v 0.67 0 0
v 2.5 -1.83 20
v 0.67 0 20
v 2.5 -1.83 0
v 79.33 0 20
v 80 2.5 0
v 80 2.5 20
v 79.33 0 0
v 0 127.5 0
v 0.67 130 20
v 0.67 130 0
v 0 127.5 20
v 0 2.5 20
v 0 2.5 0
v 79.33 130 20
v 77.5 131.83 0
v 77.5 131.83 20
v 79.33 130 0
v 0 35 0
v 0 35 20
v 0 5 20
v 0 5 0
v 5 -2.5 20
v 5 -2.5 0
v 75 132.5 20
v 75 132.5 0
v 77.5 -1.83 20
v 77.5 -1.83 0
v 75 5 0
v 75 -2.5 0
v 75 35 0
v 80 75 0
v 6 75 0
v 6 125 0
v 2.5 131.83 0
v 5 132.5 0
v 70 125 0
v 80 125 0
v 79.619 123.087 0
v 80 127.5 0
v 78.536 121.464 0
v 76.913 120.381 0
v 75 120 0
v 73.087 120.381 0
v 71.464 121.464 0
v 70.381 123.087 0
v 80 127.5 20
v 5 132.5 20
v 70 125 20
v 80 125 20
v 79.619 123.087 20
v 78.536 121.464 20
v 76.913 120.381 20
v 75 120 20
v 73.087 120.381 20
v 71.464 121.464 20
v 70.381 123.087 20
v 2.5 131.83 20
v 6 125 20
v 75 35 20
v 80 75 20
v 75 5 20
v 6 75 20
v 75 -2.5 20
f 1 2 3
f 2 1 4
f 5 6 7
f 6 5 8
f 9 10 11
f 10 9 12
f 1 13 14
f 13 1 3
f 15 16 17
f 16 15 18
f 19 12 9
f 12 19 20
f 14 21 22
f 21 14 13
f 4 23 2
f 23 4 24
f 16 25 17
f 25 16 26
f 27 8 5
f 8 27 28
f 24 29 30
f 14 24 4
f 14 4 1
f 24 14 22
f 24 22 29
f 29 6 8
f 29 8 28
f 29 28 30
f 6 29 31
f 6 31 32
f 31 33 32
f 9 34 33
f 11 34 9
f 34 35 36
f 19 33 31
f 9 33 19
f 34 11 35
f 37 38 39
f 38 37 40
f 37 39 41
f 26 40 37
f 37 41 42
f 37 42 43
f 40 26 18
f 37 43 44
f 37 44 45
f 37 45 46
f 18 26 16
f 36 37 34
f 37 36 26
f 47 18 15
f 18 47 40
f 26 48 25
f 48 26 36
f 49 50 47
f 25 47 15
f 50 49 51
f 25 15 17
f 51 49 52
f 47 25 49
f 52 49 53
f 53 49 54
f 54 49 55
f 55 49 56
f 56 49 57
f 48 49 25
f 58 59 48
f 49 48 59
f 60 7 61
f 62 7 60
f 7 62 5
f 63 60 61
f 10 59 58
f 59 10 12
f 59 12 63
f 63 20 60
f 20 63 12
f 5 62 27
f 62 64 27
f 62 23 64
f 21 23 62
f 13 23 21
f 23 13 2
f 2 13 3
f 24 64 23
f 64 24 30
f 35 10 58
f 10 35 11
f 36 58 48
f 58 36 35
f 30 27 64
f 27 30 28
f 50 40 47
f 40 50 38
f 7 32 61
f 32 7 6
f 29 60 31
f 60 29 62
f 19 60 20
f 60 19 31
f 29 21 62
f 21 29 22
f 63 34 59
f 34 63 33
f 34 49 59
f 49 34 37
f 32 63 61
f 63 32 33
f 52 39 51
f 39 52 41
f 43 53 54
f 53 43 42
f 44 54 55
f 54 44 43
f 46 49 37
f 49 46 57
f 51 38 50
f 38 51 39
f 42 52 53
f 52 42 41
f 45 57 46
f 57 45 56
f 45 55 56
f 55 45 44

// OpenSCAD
// Customizable Desk Hook
// by knarfishness
// Diesel Powered Robotics, 2013

// variables

//Total width
width = 80;

//Total length
length = 130;

// The width of the surface to clamp to
clamp_width = 30;

// The width of the hook
hook_width = 50;

// The thickness of the hook
thickness = 5;

// Hook height
height = 20;

// Catch Diameter 
catch = 5;

// Rounding Radius (1 to 40)
rounding_radius = 5;

// Clamp Depth Offset
clamp_offset = 0;

// Hook Depth Offset
hook_offset = 0;

add_catch = "true"; // [true,false]


// size - [x,y,z]
// radius - radius of corners
module roundedRect(size, radius)
{
	x = size[0];
	y = size[1];
	z = size[2];

	linear_extrude(height=z)
	hull()
	{
		// place 4 circles in the corners, with the given radius
		translate([(-x/2)+(radius/2), (-y/2)+(radius/2), 0])
		circle(r=radius);
	
		translate([(x/2)-(radius/2), (-y/2)+(radius/2), 0])
		circle(r=radius);
	
		translate([(-x/2)+(radius/2), (y/2)-(radius/2), 0])
		circle(r=radius);
	
		translate([(x/2)-(radius/2), (y/2)-(radius/2), 0])
		circle(r=radius);
	}
}


module base()
{
	//cube([width, length, height]);
	translate([width/2,length/2,0])
	roundedRect([width-rounding_radius, length, height], rounding_radius, $fn=12);
}

module clamp()
{
	translate([-1,thickness,-2])
	cube([width-thickness-clamp_offset+1, clamp_width, height+4]);
}

module hook()
{
	translate([thickness + hook_offset +1, length - hook_width - thickness,-2])
	cube([width-thickness+1, hook_width, height+4]);
}

module top()
{
	difference()
	{
		base();
		clamp();
	}
}

module loop()
{
	translate([width - catch,length-thickness,0])
	cylinder(h = height, r1 = catch, r2 = catch, center = false);
}

module final()
{
	difference()
	{
		top();
		hook();
	}
}

if(add_catch == "true")
{
	loop();
}

final();
